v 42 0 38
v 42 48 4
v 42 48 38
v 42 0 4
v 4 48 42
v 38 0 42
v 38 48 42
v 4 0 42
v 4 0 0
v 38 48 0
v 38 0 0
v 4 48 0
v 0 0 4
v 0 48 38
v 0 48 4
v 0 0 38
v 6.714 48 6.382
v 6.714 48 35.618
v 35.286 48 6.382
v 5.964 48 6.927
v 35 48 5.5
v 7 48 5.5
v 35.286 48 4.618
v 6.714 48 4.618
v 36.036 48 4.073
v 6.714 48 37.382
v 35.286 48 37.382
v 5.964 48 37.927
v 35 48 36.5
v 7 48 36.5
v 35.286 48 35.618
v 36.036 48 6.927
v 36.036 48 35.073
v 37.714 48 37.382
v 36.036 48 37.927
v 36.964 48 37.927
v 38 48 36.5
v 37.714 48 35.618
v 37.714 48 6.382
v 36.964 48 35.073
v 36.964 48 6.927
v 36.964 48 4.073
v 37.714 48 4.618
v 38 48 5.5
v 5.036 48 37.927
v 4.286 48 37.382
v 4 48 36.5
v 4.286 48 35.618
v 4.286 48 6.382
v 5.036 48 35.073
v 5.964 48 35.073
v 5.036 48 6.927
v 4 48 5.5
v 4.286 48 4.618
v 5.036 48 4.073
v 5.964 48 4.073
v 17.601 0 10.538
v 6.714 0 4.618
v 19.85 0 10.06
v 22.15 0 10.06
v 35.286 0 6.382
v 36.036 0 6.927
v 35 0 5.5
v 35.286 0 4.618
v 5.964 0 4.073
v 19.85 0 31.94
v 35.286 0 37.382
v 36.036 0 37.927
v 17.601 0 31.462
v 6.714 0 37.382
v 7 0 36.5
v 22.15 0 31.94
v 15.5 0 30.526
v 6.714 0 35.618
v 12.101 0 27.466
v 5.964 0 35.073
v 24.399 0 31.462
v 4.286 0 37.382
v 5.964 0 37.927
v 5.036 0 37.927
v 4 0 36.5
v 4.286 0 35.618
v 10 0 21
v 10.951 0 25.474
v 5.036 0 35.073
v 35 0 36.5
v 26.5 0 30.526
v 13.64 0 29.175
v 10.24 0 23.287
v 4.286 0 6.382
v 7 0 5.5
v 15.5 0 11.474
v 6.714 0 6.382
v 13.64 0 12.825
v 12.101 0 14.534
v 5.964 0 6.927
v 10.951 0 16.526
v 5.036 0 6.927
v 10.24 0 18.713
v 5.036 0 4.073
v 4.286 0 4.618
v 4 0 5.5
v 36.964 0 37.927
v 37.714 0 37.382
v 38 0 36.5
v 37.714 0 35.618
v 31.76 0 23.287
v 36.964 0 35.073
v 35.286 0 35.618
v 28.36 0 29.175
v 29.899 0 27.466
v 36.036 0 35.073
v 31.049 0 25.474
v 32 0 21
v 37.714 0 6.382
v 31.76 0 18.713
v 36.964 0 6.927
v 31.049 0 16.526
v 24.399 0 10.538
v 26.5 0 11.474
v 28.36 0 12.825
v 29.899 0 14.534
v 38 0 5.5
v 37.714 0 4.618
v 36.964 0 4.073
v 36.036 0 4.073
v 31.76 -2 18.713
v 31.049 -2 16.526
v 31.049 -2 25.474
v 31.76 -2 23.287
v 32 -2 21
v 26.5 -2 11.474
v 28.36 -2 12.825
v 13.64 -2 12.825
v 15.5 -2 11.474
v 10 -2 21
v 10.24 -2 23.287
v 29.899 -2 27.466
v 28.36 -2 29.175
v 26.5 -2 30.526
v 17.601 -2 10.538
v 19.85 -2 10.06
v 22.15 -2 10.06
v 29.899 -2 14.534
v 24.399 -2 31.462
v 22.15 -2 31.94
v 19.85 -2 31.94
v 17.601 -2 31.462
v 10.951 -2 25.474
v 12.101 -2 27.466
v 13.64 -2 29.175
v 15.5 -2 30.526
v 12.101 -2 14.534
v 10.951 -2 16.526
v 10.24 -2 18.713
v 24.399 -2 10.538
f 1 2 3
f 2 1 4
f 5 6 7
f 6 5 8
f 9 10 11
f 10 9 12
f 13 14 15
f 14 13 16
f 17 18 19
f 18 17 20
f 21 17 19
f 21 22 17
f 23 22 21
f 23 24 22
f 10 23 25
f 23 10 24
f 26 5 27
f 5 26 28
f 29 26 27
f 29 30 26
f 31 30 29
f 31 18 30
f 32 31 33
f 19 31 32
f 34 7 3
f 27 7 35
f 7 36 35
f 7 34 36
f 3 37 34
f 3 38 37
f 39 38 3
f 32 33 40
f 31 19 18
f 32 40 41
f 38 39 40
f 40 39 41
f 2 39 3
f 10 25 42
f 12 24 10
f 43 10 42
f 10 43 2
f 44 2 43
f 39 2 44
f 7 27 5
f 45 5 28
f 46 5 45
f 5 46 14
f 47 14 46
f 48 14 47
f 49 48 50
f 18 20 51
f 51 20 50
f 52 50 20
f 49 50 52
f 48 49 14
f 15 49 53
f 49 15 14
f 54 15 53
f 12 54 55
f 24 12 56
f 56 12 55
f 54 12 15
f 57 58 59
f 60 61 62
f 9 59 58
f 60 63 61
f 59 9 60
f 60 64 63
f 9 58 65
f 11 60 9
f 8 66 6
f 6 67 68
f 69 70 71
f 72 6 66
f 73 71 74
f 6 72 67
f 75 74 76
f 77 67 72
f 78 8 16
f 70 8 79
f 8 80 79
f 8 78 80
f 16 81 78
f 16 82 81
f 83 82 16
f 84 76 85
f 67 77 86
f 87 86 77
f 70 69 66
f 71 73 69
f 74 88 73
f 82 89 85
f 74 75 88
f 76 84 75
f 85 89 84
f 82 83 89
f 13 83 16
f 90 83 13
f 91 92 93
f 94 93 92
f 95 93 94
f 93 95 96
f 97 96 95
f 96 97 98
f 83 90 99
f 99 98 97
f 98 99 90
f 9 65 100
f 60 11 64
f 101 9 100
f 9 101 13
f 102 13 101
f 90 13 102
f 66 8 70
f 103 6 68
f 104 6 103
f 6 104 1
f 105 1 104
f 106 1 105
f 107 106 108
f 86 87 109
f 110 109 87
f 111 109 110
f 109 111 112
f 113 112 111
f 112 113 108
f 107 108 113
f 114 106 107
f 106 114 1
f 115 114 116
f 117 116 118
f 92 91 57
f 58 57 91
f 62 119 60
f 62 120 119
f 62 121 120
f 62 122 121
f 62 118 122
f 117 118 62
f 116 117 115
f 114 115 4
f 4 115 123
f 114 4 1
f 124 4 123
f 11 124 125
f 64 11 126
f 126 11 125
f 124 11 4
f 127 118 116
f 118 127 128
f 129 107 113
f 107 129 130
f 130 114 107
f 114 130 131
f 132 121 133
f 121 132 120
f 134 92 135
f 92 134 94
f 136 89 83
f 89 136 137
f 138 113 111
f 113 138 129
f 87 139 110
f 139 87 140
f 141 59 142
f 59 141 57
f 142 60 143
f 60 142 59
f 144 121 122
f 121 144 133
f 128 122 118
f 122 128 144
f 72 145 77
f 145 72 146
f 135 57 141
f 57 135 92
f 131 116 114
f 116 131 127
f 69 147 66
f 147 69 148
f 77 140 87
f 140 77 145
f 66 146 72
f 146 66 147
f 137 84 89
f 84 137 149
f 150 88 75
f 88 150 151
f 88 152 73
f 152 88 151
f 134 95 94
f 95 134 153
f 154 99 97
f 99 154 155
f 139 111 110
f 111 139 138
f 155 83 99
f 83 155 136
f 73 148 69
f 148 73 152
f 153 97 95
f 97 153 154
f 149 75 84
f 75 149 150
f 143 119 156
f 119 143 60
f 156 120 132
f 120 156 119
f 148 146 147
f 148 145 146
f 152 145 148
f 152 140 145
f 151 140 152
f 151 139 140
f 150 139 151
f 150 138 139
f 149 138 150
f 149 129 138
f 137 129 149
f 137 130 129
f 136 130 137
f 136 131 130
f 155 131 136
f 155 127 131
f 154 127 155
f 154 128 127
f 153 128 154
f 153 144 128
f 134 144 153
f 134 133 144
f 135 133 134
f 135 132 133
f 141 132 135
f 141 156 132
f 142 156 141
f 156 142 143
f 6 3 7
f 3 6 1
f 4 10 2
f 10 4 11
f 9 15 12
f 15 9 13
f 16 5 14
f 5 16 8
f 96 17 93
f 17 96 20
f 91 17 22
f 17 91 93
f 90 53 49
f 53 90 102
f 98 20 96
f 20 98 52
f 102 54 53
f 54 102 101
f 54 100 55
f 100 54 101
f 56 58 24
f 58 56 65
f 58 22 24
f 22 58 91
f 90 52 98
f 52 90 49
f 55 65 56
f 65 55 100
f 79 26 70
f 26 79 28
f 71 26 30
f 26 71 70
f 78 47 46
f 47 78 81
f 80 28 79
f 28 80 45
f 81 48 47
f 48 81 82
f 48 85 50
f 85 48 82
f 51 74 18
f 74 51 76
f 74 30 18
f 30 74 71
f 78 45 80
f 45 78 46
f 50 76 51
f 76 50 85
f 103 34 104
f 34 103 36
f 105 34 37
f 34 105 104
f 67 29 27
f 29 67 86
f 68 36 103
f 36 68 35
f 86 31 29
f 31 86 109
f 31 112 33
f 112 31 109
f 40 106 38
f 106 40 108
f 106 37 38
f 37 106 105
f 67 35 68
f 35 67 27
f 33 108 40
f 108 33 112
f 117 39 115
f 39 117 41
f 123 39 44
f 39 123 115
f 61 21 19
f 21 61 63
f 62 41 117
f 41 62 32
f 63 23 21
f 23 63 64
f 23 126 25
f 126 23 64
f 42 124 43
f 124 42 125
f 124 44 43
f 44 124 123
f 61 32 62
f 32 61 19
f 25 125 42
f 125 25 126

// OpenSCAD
//NEMA 17 dimensions
	//BODY 
		b_height = 42;
		b_width = 42;
		b_depth = 48;
		b_cylinder_r = 11;
		b_cylinder_depth = 2; 
	//CHAMFER
	//4mm from edge, 45°: square prism width sqrt(2)* half the 
	//sqr diagonal. This will be the subtracted amount per side
		ch_side = sqrt(2)*4;
	//HOLES POSITIONING
		holes_spacing = 31;
		borders = (b_width - holes_spacing)/2;
		h_radius = 1.5;
		

difference() {
	//BODY
		difference() {
			//MAIN BLOCK
			union() { 
				cube([b_width,b_depth,b_height]);
				translate ([b_width/2,0,b_height/2]) rotate([90,0,0]) cylinder(h=b_cylinder_depth,r=b_cylinder_r); 
				}
		//CHAMFER
		for(i = [ [b_width,20,b_height],
			[b_width,20,0],
			[0,20,0],
			[0,20,b_height]])
		
			{translate(i) rotate([90,45,0]) cube([ch_side,ch_side,80],
				center=true);}
			//
		 }
		//
	//HOLES
	for(i=[ [borders,60,borders],
		[borders,60,(borders+holes_spacing)],
		[(borders+holes_spacing),60,(borders+holes_spacing)],
		[(borders+holes_spacing),60,borders] ]) 
	{
		translate(i) rotate([90,0,0]) cylinder(h=80,r=h_radius, $fn=10);
	}
	
}
